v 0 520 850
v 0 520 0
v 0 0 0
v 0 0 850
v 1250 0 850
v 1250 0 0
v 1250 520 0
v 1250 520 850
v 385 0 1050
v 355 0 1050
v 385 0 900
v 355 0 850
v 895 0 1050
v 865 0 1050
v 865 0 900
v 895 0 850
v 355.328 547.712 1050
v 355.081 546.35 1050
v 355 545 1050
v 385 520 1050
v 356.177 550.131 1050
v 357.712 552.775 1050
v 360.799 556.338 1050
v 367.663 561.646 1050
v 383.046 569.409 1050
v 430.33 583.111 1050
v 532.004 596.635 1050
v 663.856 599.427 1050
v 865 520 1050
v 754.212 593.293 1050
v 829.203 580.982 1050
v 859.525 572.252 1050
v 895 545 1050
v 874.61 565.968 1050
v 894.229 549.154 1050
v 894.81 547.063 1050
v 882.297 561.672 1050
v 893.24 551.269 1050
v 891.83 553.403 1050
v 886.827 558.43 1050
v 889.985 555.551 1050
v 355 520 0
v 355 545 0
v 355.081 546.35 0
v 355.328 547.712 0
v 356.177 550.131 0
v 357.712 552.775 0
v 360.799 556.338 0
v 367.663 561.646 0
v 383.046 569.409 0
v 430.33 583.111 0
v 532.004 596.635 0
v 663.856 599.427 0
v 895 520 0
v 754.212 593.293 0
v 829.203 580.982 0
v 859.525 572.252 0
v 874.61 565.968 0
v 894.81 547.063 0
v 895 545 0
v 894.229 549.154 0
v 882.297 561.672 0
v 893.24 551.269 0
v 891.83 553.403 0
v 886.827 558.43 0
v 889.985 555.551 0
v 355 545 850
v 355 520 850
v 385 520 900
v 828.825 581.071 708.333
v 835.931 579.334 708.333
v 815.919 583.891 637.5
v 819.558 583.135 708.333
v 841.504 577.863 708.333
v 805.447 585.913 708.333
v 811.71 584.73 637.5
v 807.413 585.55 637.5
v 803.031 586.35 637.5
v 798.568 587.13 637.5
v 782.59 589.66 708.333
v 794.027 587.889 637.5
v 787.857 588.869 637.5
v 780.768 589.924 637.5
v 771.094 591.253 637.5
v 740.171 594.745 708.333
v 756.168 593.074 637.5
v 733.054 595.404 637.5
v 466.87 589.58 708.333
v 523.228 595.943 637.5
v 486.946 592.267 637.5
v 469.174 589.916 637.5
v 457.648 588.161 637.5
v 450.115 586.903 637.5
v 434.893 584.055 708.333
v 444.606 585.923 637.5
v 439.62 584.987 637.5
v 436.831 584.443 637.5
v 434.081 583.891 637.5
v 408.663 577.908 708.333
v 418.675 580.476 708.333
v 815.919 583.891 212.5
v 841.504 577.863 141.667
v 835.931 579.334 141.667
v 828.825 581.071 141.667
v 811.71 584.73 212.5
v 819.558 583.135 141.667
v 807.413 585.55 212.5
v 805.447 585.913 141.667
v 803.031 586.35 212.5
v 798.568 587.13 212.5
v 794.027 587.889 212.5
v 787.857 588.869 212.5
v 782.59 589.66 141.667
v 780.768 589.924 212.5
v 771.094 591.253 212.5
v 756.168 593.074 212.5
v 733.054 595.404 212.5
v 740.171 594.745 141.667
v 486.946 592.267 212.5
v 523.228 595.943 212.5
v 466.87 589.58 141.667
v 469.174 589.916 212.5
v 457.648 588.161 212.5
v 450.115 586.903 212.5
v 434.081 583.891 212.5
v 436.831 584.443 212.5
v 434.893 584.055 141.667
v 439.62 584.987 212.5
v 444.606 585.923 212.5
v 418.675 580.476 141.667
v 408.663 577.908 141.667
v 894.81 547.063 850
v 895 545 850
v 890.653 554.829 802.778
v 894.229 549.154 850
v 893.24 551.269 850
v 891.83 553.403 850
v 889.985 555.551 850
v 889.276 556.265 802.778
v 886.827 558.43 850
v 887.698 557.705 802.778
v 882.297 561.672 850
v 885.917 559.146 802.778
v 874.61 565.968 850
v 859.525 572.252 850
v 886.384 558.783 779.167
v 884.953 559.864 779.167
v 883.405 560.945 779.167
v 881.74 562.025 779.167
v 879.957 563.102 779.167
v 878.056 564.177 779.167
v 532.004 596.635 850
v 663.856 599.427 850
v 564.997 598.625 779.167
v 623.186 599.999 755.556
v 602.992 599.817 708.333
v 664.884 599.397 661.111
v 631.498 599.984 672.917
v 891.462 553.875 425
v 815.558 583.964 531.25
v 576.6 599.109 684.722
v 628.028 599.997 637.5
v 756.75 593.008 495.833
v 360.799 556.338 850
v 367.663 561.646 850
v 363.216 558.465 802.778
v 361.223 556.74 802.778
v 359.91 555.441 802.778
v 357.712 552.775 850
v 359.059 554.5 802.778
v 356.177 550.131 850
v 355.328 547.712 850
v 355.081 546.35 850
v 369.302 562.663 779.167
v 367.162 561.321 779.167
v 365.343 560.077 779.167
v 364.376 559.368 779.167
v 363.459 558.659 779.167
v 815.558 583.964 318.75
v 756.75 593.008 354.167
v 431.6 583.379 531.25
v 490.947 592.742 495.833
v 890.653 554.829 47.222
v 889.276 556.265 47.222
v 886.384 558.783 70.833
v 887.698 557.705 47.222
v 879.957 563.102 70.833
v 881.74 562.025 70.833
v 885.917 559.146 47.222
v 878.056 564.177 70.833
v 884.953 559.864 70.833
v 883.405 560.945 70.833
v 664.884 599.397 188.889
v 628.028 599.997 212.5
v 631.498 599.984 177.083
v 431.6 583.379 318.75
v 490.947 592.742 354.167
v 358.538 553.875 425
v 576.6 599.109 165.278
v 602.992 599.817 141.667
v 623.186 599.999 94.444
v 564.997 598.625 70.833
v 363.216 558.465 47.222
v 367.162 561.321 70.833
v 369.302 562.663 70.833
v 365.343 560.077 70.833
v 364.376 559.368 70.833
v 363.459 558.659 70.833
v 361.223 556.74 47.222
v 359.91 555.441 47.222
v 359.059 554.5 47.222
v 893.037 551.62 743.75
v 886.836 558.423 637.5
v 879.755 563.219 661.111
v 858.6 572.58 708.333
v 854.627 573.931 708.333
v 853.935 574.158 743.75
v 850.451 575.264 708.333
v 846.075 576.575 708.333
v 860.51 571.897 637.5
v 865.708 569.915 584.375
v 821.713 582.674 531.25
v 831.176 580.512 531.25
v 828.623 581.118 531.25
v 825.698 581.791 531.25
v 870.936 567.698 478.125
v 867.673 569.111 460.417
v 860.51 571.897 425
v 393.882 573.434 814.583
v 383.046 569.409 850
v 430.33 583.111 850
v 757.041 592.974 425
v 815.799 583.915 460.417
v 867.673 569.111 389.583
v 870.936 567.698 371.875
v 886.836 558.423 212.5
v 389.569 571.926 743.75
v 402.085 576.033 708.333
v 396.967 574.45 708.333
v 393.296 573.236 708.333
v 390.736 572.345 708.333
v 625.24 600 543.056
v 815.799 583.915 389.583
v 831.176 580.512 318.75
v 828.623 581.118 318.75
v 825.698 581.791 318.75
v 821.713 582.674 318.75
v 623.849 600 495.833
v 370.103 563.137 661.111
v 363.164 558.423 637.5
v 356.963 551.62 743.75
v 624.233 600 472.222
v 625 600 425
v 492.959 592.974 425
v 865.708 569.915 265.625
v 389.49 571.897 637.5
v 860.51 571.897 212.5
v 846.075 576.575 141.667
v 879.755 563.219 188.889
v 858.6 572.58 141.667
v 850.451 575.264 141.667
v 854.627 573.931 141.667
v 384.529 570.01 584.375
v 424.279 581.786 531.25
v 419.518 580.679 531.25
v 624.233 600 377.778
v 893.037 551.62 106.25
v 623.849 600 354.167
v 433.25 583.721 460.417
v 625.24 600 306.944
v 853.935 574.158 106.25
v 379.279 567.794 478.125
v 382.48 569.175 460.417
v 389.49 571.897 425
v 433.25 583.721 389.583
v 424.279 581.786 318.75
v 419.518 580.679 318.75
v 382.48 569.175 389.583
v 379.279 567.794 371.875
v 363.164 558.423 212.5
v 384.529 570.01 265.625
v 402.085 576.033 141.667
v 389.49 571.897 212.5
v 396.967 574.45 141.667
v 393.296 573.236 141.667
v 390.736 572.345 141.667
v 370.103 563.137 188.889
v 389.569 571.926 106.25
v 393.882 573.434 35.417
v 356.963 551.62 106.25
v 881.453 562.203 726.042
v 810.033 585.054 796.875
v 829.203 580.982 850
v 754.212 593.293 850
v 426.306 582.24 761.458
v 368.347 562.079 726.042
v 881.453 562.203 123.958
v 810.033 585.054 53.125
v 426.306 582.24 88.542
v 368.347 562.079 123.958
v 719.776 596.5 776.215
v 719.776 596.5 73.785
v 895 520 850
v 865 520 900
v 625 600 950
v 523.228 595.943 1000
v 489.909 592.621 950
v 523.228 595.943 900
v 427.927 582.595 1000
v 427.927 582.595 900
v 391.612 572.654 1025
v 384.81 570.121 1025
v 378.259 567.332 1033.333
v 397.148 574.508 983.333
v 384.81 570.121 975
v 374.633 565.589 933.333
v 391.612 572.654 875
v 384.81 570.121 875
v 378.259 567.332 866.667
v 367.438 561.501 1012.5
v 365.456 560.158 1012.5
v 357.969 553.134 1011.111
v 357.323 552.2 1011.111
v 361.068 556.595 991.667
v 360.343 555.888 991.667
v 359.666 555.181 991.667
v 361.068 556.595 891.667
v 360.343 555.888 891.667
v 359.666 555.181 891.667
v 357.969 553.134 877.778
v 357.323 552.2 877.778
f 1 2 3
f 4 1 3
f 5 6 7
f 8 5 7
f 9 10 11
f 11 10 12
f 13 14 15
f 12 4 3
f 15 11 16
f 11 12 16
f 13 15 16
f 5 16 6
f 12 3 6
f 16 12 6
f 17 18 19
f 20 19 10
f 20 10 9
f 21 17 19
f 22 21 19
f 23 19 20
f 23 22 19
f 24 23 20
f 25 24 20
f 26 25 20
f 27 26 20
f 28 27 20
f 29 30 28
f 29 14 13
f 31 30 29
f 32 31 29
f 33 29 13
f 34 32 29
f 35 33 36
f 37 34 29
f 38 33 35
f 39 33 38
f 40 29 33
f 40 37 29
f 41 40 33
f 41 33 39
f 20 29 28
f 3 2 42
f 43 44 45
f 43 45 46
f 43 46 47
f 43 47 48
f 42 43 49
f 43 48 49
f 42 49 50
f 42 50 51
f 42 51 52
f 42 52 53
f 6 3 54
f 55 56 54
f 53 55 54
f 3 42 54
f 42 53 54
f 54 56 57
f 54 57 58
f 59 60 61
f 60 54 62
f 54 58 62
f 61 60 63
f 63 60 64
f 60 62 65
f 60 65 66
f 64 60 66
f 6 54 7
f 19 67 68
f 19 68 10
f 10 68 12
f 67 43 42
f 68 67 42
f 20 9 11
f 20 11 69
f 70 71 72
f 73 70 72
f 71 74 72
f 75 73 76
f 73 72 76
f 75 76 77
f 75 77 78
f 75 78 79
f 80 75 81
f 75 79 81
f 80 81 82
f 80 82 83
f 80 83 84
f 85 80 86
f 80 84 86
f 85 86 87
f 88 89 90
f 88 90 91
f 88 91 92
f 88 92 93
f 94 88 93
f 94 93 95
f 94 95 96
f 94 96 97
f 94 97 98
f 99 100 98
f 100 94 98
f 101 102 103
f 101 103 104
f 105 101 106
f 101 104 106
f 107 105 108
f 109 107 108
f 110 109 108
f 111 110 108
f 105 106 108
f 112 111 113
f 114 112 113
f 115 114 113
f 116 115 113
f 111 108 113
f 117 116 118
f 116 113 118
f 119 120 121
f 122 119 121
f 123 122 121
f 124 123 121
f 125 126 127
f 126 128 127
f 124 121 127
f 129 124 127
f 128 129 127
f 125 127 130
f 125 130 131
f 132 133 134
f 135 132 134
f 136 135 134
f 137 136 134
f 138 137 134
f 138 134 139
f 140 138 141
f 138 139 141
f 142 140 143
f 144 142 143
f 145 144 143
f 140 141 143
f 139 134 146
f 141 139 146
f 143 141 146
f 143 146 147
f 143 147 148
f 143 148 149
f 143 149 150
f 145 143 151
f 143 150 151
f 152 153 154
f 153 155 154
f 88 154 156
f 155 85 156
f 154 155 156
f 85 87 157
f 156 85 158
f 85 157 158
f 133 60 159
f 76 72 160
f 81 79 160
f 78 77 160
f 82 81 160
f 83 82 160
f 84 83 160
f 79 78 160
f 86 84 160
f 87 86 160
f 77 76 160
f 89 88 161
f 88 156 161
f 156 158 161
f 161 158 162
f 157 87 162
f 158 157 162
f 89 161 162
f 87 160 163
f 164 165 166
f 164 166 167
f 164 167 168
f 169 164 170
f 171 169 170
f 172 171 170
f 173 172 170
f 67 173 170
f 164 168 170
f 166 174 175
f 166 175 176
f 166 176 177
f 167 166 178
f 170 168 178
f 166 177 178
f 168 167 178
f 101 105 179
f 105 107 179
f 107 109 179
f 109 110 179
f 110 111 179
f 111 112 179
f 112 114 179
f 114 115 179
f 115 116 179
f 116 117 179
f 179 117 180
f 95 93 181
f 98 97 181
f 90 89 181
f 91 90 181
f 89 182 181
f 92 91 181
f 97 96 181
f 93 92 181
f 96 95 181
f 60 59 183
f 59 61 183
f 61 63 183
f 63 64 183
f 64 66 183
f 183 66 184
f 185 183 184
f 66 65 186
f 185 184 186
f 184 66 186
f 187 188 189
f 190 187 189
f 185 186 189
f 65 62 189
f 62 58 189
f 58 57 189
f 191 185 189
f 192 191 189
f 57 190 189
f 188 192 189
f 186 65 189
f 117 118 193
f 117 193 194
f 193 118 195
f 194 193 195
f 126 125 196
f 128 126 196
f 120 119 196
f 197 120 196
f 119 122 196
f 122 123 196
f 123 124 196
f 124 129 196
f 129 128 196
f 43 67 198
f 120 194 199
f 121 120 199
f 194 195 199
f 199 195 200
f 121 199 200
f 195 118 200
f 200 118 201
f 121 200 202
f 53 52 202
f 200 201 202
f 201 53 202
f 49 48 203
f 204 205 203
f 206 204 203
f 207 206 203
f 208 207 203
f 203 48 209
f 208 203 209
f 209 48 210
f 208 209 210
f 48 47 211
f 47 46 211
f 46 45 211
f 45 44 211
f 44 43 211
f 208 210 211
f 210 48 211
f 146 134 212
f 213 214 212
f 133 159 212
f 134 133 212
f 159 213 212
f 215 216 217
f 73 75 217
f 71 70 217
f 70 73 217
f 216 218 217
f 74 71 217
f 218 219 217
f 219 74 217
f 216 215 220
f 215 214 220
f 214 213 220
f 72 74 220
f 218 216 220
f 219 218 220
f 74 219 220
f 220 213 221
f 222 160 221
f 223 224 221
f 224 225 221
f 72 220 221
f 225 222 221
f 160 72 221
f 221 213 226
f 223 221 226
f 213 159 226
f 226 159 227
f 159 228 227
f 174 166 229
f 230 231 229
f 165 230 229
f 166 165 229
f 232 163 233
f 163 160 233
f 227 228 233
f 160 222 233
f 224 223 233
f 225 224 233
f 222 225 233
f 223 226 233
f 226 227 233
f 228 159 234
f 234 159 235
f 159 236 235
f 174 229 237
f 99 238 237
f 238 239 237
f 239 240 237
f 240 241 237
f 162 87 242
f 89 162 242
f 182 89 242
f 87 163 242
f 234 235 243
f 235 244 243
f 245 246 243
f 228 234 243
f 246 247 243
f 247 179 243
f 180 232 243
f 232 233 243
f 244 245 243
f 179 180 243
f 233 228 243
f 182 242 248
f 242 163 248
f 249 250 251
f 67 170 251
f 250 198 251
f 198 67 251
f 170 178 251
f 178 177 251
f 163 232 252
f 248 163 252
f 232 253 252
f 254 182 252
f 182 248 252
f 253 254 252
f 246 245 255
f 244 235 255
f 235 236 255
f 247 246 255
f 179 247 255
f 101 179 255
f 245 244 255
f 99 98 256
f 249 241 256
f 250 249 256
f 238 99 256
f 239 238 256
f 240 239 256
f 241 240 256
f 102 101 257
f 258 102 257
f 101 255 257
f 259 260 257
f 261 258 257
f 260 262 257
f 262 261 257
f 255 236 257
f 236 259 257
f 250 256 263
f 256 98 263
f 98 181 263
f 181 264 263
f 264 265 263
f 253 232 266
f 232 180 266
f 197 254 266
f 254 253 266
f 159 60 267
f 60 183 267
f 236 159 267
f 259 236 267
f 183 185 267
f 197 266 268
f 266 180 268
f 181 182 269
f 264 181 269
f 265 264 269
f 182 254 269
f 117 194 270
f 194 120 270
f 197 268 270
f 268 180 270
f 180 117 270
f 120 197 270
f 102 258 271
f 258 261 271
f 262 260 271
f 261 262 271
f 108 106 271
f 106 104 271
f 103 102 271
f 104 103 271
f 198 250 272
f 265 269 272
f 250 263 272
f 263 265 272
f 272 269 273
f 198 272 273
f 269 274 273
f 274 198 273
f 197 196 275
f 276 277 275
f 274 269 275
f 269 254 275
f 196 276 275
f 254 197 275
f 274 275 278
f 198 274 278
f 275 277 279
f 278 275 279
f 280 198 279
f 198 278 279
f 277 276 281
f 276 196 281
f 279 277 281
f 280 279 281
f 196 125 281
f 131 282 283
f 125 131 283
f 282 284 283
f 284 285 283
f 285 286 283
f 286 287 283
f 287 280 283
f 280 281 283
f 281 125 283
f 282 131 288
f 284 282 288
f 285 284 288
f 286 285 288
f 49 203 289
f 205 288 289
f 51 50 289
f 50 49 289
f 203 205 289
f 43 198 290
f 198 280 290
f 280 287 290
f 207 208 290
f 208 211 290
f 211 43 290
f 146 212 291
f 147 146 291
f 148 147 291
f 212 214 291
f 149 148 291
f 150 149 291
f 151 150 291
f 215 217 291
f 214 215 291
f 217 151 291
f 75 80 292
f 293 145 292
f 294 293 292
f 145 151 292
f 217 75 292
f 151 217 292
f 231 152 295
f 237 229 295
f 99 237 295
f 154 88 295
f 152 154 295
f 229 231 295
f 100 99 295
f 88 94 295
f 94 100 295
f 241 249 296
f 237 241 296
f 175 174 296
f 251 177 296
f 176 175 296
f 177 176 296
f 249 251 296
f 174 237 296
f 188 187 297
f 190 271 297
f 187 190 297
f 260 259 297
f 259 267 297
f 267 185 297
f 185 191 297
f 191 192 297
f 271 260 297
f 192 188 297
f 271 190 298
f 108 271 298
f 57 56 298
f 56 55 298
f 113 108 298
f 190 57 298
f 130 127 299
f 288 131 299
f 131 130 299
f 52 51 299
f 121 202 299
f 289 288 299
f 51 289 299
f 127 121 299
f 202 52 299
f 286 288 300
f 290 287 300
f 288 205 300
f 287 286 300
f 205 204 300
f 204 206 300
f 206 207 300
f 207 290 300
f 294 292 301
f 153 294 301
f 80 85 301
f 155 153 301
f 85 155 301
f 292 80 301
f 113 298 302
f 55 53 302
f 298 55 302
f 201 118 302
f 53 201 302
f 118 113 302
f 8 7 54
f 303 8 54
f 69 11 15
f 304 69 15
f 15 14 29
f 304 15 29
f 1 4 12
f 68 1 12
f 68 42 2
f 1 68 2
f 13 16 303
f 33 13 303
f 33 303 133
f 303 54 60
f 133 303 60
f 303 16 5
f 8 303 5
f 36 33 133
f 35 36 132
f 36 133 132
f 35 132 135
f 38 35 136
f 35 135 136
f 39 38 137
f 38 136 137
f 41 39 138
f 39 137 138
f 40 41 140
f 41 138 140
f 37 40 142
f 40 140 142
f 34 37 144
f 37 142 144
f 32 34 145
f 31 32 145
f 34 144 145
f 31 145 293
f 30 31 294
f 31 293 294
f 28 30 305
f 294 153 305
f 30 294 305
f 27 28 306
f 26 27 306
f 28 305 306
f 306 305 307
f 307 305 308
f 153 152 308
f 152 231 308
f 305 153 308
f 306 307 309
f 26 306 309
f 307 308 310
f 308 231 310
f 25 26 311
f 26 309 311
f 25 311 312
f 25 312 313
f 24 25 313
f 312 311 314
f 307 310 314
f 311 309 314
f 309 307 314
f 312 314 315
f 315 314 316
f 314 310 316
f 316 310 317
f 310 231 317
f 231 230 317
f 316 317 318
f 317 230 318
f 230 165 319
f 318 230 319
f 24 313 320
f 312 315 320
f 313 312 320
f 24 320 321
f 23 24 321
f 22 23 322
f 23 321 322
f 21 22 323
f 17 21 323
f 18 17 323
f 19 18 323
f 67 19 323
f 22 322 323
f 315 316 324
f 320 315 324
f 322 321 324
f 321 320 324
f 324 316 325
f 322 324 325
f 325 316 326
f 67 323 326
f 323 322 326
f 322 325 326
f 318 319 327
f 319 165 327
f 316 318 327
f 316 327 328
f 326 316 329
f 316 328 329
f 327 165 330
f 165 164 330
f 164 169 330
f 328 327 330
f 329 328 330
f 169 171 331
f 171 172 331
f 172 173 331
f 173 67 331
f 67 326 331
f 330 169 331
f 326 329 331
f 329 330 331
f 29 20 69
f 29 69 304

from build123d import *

# Parameters (mm, degrees)
F1_DEPTH = 850
F3_DEPTH = 200
F4_W     = 480
F4_H     = 520
F5_DEPTH = 150


with BuildPart() as f1:
    # F0 (on Top) → F1 (new body)
    with BuildSketch(Plane.XY):
        with BuildLine():
            Line((0, 520), (0, 0))
            Line((0, 0), (1250, 0))
            Line((1250, 0), (1250, 520))
            Line((1250, 520), (895, 520))
            Line((895, 520), (895, 545))
            add(Edge.make_bspline(
                [(895, 545), (895, 600), (625, 600), (355, 600), (355, 545)],
                knots=[3.1415926536, 3.1415926536, 3.1415926536, 4.7123889804, 4.7123889804, 6.2831853072, 6.2831853072, 6.2831853072], degree=2, weights=[1, 0.7071067812, 1, 0.7071067812, 1]))
            Line((355, 545), (355, 520))
            Line((355, 520), (0, 520))
        make_face()
    extrude(amount=F1_DEPTH)

    # F2 (on face) → F3 (join)
    with BuildSketch(Plane.XY.offset(850)):
        with BuildLine():
            Line((895, 520), (895, 545))
            add(Edge.make_bspline(
                [(895, 545), (895, 600), (625, 600), (355, 600), (355, 545)],
                knots=[3.1415926536, 3.1415926536, 3.1415926536, 4.7123889804, 4.7123889804, 6.2831853072, 6.2831853072, 6.2831853072], degree=2, weights=[1, 0.7071067812, 1, 0.7071067812, 1]))
            Line((355, 545), (355, 520))
            Line((355, 520), (355, 0))
            Line((355, 0), (895, 0))
            Line((895, 0), (895, 520))
        make_face()
    extrude(amount=F3_DEPTH)

    # F4 (on face) → F5 (cut)
    with BuildSketch(Plane.XY.offset(1050)):
        with Locations((625, 260)):
            Rectangle(F4_W, F4_H)
    extrude(amount=-F5_DEPTH, mode=Mode.SUBTRACT)


solid = f1.part
